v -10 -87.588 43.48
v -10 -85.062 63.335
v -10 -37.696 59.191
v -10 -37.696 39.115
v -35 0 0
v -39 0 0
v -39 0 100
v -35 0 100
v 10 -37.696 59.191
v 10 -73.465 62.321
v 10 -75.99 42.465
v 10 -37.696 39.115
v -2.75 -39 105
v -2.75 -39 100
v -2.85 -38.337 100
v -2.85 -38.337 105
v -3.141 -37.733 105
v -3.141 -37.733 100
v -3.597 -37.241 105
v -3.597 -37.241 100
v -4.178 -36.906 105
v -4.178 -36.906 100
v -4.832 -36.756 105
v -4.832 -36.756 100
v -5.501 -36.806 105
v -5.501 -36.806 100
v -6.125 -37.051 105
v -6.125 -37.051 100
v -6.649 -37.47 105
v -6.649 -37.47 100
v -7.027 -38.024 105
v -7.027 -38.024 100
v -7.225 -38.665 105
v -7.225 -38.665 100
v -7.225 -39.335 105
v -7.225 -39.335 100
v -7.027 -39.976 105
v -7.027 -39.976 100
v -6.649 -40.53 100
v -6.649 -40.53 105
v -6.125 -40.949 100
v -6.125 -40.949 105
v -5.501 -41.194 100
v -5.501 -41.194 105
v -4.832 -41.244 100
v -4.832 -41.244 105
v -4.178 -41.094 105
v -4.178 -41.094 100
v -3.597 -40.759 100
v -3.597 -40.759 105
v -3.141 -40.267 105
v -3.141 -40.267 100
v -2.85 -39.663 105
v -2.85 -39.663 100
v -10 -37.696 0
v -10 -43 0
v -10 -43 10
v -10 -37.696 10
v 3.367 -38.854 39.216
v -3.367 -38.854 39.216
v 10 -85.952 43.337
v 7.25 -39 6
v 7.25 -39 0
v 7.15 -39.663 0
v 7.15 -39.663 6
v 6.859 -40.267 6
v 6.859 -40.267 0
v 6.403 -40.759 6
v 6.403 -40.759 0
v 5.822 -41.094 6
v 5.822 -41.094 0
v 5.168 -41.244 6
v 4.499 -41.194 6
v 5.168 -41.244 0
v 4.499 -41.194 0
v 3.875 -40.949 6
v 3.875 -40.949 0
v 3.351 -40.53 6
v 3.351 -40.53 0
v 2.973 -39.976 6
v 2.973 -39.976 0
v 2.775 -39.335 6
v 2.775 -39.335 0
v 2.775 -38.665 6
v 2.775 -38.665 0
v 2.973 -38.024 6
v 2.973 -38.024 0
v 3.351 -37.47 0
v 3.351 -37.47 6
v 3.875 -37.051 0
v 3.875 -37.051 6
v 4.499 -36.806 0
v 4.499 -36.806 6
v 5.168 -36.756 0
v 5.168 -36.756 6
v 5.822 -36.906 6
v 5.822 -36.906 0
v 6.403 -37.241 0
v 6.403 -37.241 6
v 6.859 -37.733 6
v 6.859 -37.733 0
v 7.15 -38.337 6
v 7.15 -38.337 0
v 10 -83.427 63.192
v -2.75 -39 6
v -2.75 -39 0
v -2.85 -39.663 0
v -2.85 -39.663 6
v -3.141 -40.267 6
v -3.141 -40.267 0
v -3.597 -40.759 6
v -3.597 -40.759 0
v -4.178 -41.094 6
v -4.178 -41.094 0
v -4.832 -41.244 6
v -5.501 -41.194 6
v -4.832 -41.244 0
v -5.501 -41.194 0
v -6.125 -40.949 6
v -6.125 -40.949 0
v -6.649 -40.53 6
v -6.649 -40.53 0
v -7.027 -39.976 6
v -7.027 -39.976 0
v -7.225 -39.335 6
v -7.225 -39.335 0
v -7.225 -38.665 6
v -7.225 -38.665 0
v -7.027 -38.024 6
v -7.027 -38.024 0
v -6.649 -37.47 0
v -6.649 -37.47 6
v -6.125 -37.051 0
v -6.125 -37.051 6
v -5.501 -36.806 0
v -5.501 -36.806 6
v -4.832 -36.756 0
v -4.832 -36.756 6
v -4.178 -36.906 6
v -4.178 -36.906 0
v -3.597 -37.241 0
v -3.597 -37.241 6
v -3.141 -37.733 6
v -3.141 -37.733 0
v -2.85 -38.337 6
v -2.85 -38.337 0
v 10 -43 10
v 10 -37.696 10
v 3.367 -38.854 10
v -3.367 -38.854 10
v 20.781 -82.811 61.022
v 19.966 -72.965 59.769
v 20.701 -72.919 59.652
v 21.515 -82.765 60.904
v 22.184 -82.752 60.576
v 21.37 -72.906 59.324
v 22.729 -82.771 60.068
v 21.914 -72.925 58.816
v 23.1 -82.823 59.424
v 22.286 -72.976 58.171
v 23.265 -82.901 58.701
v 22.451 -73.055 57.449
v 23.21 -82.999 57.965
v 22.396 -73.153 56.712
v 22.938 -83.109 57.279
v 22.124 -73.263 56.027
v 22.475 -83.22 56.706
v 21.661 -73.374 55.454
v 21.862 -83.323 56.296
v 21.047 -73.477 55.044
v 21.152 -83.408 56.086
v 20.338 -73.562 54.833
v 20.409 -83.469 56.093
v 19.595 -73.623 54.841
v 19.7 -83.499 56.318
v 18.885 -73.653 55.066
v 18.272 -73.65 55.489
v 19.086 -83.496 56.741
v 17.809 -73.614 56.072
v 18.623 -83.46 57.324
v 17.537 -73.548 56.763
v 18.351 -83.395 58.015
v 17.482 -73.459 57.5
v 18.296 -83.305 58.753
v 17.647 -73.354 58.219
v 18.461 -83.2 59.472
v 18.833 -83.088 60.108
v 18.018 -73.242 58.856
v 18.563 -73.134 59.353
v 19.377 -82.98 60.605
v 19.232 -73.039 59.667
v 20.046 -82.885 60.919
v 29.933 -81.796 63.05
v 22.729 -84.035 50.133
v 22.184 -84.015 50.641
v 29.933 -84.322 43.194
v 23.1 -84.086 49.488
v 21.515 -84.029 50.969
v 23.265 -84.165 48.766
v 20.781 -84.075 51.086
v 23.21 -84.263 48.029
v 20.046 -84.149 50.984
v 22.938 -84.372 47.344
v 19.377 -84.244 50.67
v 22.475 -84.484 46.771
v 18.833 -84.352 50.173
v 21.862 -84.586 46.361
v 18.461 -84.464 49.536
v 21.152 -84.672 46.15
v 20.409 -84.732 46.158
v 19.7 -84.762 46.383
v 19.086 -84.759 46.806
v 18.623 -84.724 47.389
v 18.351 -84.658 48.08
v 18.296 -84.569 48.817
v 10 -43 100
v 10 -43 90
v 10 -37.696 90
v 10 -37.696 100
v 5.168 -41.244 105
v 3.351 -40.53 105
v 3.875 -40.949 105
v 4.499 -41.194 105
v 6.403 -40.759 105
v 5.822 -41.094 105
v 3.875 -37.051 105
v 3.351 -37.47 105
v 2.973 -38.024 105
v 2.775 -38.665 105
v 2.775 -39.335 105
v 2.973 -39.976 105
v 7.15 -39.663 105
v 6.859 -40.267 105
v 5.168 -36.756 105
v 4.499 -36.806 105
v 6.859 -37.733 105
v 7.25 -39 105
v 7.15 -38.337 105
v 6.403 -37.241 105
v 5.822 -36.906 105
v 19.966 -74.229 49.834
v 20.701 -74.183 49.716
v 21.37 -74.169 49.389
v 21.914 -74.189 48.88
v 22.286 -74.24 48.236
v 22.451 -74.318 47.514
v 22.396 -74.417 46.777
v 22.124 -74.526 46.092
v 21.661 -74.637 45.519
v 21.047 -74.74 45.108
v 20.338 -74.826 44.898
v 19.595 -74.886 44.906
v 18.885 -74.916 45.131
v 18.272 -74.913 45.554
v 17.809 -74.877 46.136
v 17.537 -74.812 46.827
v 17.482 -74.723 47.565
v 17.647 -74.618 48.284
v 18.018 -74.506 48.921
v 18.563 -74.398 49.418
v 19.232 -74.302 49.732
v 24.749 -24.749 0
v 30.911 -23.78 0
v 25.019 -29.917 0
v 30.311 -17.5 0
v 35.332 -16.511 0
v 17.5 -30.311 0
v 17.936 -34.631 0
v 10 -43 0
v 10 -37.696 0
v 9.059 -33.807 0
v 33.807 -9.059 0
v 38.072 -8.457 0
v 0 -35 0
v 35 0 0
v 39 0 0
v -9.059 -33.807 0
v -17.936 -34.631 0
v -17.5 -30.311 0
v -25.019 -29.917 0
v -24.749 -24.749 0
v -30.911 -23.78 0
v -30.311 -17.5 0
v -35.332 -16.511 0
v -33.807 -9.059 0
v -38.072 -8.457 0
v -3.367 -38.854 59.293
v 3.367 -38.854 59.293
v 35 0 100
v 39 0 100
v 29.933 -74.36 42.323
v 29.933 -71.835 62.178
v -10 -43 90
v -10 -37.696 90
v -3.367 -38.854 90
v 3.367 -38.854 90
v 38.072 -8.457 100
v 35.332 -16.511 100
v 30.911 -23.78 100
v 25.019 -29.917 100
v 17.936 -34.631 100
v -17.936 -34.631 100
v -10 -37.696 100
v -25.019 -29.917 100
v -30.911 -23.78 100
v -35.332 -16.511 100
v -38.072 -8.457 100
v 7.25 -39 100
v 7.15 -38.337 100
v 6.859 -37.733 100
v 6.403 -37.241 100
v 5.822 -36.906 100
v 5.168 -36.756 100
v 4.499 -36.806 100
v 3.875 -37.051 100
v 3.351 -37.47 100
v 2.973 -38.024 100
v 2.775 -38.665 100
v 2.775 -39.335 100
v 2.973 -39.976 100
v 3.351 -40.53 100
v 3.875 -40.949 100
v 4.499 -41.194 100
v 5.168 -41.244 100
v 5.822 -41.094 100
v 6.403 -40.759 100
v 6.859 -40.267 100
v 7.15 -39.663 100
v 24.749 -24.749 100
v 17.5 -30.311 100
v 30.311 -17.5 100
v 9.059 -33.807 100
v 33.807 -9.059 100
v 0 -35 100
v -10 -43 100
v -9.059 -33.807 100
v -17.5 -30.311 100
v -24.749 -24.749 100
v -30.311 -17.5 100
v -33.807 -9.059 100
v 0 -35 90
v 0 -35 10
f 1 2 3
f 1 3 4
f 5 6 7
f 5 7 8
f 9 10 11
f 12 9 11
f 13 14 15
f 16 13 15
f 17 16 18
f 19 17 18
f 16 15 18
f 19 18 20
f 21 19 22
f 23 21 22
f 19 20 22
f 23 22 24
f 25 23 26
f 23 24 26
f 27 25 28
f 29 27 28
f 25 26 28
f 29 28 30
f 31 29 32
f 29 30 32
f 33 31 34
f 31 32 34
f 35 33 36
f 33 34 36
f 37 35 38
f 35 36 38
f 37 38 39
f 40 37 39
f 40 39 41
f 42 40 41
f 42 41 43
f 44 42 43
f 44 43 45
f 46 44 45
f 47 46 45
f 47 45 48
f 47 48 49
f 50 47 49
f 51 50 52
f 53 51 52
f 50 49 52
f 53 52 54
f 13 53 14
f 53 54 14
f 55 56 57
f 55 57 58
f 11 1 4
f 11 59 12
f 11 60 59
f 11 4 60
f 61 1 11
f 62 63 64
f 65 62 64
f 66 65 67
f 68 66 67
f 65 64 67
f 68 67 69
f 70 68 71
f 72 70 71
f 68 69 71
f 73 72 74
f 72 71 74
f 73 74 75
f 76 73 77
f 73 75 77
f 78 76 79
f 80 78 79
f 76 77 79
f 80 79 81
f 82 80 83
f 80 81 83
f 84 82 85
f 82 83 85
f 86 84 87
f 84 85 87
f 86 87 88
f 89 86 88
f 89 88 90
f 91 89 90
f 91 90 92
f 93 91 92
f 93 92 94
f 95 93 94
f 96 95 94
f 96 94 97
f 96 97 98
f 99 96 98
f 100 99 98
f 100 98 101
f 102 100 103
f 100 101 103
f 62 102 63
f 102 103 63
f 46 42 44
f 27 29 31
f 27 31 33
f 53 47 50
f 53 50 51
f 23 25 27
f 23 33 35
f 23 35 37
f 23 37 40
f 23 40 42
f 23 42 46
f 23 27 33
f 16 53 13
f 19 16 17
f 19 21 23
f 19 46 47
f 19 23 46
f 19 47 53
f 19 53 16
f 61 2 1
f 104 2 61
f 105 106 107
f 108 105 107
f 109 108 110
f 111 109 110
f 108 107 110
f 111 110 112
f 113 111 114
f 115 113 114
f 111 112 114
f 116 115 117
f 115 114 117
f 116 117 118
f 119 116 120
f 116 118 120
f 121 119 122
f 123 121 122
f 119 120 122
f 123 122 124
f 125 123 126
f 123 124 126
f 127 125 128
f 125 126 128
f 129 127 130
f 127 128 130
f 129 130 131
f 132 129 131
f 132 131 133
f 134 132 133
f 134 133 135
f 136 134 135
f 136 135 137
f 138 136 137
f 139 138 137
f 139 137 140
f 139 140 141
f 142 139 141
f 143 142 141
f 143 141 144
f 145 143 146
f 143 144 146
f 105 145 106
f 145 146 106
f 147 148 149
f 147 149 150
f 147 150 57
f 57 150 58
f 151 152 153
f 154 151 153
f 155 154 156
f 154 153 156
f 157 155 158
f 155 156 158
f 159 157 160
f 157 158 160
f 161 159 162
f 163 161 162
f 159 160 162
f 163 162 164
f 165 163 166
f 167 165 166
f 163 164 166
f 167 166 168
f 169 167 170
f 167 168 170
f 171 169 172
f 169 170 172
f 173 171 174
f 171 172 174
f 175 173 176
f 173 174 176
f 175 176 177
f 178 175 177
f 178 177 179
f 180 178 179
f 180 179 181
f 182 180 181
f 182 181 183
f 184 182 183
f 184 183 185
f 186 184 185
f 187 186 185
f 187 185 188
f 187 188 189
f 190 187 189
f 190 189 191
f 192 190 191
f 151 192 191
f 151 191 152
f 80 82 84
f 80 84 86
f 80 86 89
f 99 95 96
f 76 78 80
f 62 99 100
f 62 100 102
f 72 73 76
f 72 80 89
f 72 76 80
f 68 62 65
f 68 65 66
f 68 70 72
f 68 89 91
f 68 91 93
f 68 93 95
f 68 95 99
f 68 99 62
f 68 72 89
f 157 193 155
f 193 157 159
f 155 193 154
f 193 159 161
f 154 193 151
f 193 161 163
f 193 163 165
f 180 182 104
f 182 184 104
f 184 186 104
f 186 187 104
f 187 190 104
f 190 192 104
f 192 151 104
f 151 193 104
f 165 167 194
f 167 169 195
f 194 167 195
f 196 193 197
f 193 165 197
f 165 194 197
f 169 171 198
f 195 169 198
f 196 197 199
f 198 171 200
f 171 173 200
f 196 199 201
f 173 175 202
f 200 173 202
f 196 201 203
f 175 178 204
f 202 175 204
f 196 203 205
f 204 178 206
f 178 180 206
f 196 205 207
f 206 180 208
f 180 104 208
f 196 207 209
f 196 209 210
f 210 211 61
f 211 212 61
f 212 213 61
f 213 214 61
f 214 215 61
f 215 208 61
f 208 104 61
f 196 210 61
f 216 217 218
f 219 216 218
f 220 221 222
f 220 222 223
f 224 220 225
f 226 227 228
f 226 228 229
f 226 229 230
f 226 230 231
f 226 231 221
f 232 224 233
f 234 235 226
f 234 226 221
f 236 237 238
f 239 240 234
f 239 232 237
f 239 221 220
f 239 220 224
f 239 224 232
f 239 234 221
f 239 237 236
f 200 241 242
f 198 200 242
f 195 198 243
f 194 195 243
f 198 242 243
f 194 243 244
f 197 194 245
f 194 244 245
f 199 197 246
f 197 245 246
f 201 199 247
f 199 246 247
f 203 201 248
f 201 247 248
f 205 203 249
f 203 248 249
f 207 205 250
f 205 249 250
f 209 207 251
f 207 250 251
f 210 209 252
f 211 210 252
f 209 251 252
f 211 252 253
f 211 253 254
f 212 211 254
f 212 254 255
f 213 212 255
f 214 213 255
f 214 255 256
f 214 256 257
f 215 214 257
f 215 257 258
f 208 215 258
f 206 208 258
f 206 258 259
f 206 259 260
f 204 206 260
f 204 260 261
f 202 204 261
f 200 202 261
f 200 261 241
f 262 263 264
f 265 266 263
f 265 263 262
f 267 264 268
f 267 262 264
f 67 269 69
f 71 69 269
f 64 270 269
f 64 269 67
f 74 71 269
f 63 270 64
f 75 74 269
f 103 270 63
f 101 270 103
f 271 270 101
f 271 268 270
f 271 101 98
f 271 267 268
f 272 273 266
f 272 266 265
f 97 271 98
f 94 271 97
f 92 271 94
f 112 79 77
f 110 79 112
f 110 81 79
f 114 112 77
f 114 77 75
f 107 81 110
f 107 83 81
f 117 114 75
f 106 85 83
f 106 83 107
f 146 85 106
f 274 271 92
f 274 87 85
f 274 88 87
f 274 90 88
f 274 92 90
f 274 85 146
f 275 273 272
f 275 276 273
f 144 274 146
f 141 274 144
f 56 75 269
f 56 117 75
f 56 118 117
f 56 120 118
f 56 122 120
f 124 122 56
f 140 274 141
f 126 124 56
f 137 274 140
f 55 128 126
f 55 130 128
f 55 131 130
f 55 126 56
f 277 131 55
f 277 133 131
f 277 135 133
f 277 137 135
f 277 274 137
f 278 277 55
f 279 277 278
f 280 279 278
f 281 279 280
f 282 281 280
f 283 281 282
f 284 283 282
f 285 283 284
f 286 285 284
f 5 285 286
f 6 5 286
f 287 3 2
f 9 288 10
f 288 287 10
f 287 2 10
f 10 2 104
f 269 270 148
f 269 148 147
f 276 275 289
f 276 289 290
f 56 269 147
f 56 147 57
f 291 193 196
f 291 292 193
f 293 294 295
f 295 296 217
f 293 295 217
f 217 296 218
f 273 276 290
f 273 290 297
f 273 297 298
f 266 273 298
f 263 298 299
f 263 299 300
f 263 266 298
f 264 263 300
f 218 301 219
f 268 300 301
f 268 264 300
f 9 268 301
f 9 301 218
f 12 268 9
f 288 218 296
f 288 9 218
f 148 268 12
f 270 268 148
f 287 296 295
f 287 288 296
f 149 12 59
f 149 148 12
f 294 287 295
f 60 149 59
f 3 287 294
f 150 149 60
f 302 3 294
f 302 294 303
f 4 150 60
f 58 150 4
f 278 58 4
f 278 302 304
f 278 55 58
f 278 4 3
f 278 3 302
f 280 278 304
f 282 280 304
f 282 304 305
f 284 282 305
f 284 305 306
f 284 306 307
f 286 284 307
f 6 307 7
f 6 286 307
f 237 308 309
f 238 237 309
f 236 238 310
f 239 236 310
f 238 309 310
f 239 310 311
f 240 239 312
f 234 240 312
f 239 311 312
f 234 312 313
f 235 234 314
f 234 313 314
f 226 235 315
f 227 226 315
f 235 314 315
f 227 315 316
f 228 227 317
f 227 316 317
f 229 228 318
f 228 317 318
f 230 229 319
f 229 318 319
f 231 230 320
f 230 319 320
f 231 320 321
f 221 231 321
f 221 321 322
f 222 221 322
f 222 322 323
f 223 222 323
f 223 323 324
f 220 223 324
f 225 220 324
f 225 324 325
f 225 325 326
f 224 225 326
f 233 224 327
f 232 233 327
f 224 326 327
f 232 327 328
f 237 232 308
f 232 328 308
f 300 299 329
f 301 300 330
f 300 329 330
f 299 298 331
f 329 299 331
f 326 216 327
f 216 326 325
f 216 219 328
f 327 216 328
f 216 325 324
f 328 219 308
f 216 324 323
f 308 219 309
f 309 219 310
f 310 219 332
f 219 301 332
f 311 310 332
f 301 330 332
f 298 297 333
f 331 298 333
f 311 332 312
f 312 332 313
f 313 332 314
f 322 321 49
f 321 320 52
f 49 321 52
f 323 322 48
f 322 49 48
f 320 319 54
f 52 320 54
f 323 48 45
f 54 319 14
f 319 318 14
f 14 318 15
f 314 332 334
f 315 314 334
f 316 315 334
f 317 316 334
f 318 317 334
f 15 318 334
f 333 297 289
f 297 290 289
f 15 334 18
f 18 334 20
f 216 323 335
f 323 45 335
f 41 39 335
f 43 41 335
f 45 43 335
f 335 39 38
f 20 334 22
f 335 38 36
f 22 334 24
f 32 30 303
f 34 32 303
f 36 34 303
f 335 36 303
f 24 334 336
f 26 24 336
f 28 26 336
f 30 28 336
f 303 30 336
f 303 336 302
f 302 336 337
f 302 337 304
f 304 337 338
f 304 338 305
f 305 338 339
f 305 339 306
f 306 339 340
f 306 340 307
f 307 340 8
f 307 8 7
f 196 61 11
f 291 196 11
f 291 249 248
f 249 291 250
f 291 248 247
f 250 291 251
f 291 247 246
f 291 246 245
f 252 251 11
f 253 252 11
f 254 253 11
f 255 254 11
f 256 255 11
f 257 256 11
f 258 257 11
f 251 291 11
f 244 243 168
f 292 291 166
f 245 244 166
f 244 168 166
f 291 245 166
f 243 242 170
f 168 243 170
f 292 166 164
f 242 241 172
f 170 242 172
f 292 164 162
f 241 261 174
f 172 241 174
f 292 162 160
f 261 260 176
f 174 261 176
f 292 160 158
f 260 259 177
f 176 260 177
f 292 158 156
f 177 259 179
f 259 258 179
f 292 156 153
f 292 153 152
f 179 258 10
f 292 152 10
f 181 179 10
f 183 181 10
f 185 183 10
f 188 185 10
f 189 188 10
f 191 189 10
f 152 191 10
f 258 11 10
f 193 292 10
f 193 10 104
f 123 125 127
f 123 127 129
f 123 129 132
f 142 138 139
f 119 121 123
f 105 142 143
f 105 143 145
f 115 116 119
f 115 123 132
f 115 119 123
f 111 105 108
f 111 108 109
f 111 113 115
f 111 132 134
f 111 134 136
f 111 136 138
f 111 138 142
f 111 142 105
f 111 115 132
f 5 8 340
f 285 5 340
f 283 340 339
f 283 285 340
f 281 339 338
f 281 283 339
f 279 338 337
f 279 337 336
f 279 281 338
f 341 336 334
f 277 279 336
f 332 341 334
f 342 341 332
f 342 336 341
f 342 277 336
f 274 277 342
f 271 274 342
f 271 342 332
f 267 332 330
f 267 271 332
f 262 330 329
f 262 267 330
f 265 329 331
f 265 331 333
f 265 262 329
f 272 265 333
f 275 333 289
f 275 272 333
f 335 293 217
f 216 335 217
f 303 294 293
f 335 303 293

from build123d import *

# Parameters (mm, degrees)
EXTRUDE_THIN1_DEPTH       = 100
BOSS_EXTRUDE1_START       = -10
BOSS_EXTRUDE1_DEPTH       = 10
SKETCH3_R                 = 2.25
BOSS_EXTRUDE2_DEPTH       = 5
BOSS_EXTRUDE3_DEPTH       = 10
SKETCH5_R                 = 2.25
CUT_EXTRUDE1_DEPTH        = 6
BOSS_EXTRUDE4_REACH       = 121.416
BOSS_EXTRUDE4_END_RADIUS  = 39
SKETCH10_W                = 20
SKETCH10_H                = 20
BOSS_EXTRUDE5_START       = -39.491913729
BOSS_EXTRUDE5_OUTLINE_W   = 20
BOSS_EXTRUDE5_OUTLINE_H   = 20
BOSS_EXTRUDE5_DEPTH       = 39.491913729
BOSS_EXTRUDE5_START_2     = 91.246721786
BOSS_EXTRUDE5_2_OUTLINE_W = 23
BOSS_EXTRUDE5_2_OUTLINE_H = 23
BOSS_EXTRUDE5_2_DEPTH     = 3.753278214
BOSS_EXTRUDE6_DEPTH       = 20
SKETCH12_R                = 2.5
CUT_EXTRUDE2_DEPTH        = 20


with BuildPart() as part:
    # Sketch1 → Extrude-Thin1 (new body)
    with BuildSketch(Plane.XY):
        with BuildLine():
            ThreePointArc((-35, 0), (0, -35), (35, 0))
            Line((35, 0), (39, 0))
            ThreePointArc((39, 0), (0, -39), (-39, 0))
            Line((-39, 0), (-35, 0))
        make_face()
    extrude(amount=EXTRUDE_THIN1_DEPTH)

    # Sketch2 → Boss-Extrude1 (add)
    with BuildSketch(Plane.XY.offset(100).offset(BOSS_EXTRUDE1_START)):
        with BuildLine():
            Line((0, -39), (0, -35))
            Line((0, -35), (-10, -35))
            Line((-10, -35), (-10, -37.69615365))
            ThreePointArc((-10, -37.69615365), (-5.042321274, -38.672664715), (0, -39))
        make_face()
        with BuildLine():
            Line((10, -35), (0, -35))
            Line((0, -35), (0, -39))
            ThreePointArc((0, -39), (5.042321274, -38.672664715), (10, -37.69615365))
            Line((10, -37.69615365), (10, -35))
        make_face()
        with BuildLine():
            ThreePointArc((10, -37.69615365), (5.042321274, -38.672664715), (0, -39))
            ThreePointArc((0, -39), (-5.042321274, -38.672664715), (-10, -37.69615365))
            Line((-10, -37.69615365), (-10, -43))
            Line((-10, -43), (10, -43))
            Line((10, -43), (10, -37.69615365))
        make_face()
    extrude(amount=BOSS_EXTRUDE1_DEPTH)

    # Sketch3 → Boss-Extrude2 (add)
    with BuildSketch(Plane.XY.offset(100)):
        with Locations((-5, -39)):
            Circle(SKETCH3_R)
        with Locations((5, -39)):
            Circle(SKETCH3_R)
    extrude(amount=BOSS_EXTRUDE2_DEPTH)

    # Sketch4 → Boss-Extrude3 (add)
    with BuildSketch(Plane(origin=(0, 0, 0), x_dir=(-1, 0, 0), z_dir=(0, 0, -1))):
        with BuildLine():
            Line((0, -39), (0, -35))
            Line((0, -35), (-10, -35))
            Line((-10, -35), (-10, -37.69615365))
            ThreePointArc((-10, -37.69615365), (-5.042321274, -38.672664715), (0, -39))
        make_face()
        with BuildLine():
            ThreePointArc((10, -37.69615365), (5.042321274, -38.672664715), (0, -39))
            ThreePointArc((0, -39), (-5.042321274, -38.672664715), (-10, -37.69615365))
            Line((-10, -37.69615365), (-10, -43))
            Line((-10, -43), (10, -43))
            Line((10, -43), (10, -37.69615365))
        make_face()
        with BuildLine():
            Line((10, -35), (0, -35))
            Line((0, -35), (0, -39))
            ThreePointArc((0, -39), (5.042321274, -38.672664715), (10, -37.69615365))
            Line((10, -37.69615365), (10, -35))
        make_face()
    extrude(amount=-BOSS_EXTRUDE3_DEPTH)

    # Sketch5 → Cut-Extrude1 (cut)
    with BuildSketch(Plane(origin=(0, 0, 0), x_dir=(-1, 0, 0), z_dir=(0, 0, -1))):
        with Locations(Location((-5, -39, 0), (0, 0, 180))):
            Circle(SKETCH5_R)
        with Locations(Location((5, -39, 0), (0, 0, 180))):
            Circle(SKETCH5_R)
    extrude(amount=-CUT_EXTRUDE1_DEPTH, mode=Mode.SUBTRACT)

    # Boss-Extrude4: up to this cylinder (the profile starts outside it)
    boss_extrude4_end = Plane(origin=(0, 0, 50), z_dir=(0, 0, -1)) * Cylinder(BOSS_EXTRUDE4_END_RADIUS, 321.832, mode=Mode.PRIVATE)
    # Sketch10 → Boss-Extrude4 (add, up to the surface)
    with BuildSketch(Plane(origin=(0, -51.355775573, 4.493048169), x_dir=(1, 0, 0), z_dir=(0, 0.9961946980917462, -0.08715574274765152)), mode=Mode.PRIVATE) as boss_extrude4_sk1:
        with Locations((0, -45.680780994)):
            Rectangle(SKETCH10_W, SKETCH10_H)
    boss_extrude4_tool1 = extrude(boss_extrude4_sk1.sketch, amount=BOSS_EXTRUDE4_REACH, mode=Mode.PRIVATE) - boss_extrude4_end
    add(boss_extrude4_tool1.solids().sort_by_distance((0, -47.374433, 50))[0])

    # Boss-Extrude5: read off the stored shape, not the designer's step
    # Boss-Extrude5 outline → Boss-Extrude5 (add)
    with BuildSketch(Plane(origin=(0, -51.355775573, 4.493048169), x_dir=(1, 0, 0), z_dir=(0, 0.9961946980917462, -0.08715574274765152)).offset(BOSS_EXTRUDE5_START)):
        with Locations((0, -45.680780994)):
            Rectangle(BOSS_EXTRUDE5_OUTLINE_W, BOSS_EXTRUDE5_OUTLINE_H)
    extrude(amount=BOSS_EXTRUDE5_DEPTH)

    # Boss-Extrude5 2 outline → Boss-Extrude5 2 (cut)
    with BuildSketch(Plane(origin=(0, 0, 0), x_dir=(0.9966522374056314, 0.08110432407614805, -0.01031534248099727), z_dir=(0.08175767654690974, -0.9886876617314986, 0.12574732548071507)).offset(BOSS_EXTRUDE5_START_2)):
        with Locations((-7.5, 42.5)):
            Rectangle(BOSS_EXTRUDE5_2_OUTLINE_W, BOSS_EXTRUDE5_2_OUTLINE_H)
    extrude(amount=BOSS_EXTRUDE5_2_DEPTH, mode=Mode.SUBTRACT)

    # Sketch11 → Boss-Extrude6 (add, along a direction that is not the sketch's normal)
    with BuildSketch(Plane(origin=(10, 0, 0), x_dir=(0, 0, -1), z_dir=(1, 0, 0))):
        Polygon((-63.192356491, -83.426625408), (-43.336898209, -85.951963664), (-42.465340782, -75.990016683), (-62.320799064, -73.464678427), align=None)
    extrude(amount=BOSS_EXTRUDE6_DEPTH, dir=(0.9966471031139101, 0.0815088903864268, -0.007131103885417095))

    # Sketch12 → Cut-Extrude2 (cut)
    with BuildSketch(Plane(origin=(6.645907522, -80.368315802, 10.221732461), x_dir=(0.9966522374056314, 0.08110432407614805, -0.010315342480997362), z_dir=(-0.08175767654690974, 0.9886876617314985, -0.12574732548071624))):
        with Locations(Location((13.36525587, -47.585828212, 0), (0, 0, 270))):
            Circle(SKETCH12_R)
        with Locations(Location((13.36525587, -37.57047174, 0), (0, 0, 270))):
            Circle(SKETCH12_R)
    extrude(amount=-CUT_EXTRUDE2_DEPTH, mode=Mode.SUBTRACT)


solid = part.part
